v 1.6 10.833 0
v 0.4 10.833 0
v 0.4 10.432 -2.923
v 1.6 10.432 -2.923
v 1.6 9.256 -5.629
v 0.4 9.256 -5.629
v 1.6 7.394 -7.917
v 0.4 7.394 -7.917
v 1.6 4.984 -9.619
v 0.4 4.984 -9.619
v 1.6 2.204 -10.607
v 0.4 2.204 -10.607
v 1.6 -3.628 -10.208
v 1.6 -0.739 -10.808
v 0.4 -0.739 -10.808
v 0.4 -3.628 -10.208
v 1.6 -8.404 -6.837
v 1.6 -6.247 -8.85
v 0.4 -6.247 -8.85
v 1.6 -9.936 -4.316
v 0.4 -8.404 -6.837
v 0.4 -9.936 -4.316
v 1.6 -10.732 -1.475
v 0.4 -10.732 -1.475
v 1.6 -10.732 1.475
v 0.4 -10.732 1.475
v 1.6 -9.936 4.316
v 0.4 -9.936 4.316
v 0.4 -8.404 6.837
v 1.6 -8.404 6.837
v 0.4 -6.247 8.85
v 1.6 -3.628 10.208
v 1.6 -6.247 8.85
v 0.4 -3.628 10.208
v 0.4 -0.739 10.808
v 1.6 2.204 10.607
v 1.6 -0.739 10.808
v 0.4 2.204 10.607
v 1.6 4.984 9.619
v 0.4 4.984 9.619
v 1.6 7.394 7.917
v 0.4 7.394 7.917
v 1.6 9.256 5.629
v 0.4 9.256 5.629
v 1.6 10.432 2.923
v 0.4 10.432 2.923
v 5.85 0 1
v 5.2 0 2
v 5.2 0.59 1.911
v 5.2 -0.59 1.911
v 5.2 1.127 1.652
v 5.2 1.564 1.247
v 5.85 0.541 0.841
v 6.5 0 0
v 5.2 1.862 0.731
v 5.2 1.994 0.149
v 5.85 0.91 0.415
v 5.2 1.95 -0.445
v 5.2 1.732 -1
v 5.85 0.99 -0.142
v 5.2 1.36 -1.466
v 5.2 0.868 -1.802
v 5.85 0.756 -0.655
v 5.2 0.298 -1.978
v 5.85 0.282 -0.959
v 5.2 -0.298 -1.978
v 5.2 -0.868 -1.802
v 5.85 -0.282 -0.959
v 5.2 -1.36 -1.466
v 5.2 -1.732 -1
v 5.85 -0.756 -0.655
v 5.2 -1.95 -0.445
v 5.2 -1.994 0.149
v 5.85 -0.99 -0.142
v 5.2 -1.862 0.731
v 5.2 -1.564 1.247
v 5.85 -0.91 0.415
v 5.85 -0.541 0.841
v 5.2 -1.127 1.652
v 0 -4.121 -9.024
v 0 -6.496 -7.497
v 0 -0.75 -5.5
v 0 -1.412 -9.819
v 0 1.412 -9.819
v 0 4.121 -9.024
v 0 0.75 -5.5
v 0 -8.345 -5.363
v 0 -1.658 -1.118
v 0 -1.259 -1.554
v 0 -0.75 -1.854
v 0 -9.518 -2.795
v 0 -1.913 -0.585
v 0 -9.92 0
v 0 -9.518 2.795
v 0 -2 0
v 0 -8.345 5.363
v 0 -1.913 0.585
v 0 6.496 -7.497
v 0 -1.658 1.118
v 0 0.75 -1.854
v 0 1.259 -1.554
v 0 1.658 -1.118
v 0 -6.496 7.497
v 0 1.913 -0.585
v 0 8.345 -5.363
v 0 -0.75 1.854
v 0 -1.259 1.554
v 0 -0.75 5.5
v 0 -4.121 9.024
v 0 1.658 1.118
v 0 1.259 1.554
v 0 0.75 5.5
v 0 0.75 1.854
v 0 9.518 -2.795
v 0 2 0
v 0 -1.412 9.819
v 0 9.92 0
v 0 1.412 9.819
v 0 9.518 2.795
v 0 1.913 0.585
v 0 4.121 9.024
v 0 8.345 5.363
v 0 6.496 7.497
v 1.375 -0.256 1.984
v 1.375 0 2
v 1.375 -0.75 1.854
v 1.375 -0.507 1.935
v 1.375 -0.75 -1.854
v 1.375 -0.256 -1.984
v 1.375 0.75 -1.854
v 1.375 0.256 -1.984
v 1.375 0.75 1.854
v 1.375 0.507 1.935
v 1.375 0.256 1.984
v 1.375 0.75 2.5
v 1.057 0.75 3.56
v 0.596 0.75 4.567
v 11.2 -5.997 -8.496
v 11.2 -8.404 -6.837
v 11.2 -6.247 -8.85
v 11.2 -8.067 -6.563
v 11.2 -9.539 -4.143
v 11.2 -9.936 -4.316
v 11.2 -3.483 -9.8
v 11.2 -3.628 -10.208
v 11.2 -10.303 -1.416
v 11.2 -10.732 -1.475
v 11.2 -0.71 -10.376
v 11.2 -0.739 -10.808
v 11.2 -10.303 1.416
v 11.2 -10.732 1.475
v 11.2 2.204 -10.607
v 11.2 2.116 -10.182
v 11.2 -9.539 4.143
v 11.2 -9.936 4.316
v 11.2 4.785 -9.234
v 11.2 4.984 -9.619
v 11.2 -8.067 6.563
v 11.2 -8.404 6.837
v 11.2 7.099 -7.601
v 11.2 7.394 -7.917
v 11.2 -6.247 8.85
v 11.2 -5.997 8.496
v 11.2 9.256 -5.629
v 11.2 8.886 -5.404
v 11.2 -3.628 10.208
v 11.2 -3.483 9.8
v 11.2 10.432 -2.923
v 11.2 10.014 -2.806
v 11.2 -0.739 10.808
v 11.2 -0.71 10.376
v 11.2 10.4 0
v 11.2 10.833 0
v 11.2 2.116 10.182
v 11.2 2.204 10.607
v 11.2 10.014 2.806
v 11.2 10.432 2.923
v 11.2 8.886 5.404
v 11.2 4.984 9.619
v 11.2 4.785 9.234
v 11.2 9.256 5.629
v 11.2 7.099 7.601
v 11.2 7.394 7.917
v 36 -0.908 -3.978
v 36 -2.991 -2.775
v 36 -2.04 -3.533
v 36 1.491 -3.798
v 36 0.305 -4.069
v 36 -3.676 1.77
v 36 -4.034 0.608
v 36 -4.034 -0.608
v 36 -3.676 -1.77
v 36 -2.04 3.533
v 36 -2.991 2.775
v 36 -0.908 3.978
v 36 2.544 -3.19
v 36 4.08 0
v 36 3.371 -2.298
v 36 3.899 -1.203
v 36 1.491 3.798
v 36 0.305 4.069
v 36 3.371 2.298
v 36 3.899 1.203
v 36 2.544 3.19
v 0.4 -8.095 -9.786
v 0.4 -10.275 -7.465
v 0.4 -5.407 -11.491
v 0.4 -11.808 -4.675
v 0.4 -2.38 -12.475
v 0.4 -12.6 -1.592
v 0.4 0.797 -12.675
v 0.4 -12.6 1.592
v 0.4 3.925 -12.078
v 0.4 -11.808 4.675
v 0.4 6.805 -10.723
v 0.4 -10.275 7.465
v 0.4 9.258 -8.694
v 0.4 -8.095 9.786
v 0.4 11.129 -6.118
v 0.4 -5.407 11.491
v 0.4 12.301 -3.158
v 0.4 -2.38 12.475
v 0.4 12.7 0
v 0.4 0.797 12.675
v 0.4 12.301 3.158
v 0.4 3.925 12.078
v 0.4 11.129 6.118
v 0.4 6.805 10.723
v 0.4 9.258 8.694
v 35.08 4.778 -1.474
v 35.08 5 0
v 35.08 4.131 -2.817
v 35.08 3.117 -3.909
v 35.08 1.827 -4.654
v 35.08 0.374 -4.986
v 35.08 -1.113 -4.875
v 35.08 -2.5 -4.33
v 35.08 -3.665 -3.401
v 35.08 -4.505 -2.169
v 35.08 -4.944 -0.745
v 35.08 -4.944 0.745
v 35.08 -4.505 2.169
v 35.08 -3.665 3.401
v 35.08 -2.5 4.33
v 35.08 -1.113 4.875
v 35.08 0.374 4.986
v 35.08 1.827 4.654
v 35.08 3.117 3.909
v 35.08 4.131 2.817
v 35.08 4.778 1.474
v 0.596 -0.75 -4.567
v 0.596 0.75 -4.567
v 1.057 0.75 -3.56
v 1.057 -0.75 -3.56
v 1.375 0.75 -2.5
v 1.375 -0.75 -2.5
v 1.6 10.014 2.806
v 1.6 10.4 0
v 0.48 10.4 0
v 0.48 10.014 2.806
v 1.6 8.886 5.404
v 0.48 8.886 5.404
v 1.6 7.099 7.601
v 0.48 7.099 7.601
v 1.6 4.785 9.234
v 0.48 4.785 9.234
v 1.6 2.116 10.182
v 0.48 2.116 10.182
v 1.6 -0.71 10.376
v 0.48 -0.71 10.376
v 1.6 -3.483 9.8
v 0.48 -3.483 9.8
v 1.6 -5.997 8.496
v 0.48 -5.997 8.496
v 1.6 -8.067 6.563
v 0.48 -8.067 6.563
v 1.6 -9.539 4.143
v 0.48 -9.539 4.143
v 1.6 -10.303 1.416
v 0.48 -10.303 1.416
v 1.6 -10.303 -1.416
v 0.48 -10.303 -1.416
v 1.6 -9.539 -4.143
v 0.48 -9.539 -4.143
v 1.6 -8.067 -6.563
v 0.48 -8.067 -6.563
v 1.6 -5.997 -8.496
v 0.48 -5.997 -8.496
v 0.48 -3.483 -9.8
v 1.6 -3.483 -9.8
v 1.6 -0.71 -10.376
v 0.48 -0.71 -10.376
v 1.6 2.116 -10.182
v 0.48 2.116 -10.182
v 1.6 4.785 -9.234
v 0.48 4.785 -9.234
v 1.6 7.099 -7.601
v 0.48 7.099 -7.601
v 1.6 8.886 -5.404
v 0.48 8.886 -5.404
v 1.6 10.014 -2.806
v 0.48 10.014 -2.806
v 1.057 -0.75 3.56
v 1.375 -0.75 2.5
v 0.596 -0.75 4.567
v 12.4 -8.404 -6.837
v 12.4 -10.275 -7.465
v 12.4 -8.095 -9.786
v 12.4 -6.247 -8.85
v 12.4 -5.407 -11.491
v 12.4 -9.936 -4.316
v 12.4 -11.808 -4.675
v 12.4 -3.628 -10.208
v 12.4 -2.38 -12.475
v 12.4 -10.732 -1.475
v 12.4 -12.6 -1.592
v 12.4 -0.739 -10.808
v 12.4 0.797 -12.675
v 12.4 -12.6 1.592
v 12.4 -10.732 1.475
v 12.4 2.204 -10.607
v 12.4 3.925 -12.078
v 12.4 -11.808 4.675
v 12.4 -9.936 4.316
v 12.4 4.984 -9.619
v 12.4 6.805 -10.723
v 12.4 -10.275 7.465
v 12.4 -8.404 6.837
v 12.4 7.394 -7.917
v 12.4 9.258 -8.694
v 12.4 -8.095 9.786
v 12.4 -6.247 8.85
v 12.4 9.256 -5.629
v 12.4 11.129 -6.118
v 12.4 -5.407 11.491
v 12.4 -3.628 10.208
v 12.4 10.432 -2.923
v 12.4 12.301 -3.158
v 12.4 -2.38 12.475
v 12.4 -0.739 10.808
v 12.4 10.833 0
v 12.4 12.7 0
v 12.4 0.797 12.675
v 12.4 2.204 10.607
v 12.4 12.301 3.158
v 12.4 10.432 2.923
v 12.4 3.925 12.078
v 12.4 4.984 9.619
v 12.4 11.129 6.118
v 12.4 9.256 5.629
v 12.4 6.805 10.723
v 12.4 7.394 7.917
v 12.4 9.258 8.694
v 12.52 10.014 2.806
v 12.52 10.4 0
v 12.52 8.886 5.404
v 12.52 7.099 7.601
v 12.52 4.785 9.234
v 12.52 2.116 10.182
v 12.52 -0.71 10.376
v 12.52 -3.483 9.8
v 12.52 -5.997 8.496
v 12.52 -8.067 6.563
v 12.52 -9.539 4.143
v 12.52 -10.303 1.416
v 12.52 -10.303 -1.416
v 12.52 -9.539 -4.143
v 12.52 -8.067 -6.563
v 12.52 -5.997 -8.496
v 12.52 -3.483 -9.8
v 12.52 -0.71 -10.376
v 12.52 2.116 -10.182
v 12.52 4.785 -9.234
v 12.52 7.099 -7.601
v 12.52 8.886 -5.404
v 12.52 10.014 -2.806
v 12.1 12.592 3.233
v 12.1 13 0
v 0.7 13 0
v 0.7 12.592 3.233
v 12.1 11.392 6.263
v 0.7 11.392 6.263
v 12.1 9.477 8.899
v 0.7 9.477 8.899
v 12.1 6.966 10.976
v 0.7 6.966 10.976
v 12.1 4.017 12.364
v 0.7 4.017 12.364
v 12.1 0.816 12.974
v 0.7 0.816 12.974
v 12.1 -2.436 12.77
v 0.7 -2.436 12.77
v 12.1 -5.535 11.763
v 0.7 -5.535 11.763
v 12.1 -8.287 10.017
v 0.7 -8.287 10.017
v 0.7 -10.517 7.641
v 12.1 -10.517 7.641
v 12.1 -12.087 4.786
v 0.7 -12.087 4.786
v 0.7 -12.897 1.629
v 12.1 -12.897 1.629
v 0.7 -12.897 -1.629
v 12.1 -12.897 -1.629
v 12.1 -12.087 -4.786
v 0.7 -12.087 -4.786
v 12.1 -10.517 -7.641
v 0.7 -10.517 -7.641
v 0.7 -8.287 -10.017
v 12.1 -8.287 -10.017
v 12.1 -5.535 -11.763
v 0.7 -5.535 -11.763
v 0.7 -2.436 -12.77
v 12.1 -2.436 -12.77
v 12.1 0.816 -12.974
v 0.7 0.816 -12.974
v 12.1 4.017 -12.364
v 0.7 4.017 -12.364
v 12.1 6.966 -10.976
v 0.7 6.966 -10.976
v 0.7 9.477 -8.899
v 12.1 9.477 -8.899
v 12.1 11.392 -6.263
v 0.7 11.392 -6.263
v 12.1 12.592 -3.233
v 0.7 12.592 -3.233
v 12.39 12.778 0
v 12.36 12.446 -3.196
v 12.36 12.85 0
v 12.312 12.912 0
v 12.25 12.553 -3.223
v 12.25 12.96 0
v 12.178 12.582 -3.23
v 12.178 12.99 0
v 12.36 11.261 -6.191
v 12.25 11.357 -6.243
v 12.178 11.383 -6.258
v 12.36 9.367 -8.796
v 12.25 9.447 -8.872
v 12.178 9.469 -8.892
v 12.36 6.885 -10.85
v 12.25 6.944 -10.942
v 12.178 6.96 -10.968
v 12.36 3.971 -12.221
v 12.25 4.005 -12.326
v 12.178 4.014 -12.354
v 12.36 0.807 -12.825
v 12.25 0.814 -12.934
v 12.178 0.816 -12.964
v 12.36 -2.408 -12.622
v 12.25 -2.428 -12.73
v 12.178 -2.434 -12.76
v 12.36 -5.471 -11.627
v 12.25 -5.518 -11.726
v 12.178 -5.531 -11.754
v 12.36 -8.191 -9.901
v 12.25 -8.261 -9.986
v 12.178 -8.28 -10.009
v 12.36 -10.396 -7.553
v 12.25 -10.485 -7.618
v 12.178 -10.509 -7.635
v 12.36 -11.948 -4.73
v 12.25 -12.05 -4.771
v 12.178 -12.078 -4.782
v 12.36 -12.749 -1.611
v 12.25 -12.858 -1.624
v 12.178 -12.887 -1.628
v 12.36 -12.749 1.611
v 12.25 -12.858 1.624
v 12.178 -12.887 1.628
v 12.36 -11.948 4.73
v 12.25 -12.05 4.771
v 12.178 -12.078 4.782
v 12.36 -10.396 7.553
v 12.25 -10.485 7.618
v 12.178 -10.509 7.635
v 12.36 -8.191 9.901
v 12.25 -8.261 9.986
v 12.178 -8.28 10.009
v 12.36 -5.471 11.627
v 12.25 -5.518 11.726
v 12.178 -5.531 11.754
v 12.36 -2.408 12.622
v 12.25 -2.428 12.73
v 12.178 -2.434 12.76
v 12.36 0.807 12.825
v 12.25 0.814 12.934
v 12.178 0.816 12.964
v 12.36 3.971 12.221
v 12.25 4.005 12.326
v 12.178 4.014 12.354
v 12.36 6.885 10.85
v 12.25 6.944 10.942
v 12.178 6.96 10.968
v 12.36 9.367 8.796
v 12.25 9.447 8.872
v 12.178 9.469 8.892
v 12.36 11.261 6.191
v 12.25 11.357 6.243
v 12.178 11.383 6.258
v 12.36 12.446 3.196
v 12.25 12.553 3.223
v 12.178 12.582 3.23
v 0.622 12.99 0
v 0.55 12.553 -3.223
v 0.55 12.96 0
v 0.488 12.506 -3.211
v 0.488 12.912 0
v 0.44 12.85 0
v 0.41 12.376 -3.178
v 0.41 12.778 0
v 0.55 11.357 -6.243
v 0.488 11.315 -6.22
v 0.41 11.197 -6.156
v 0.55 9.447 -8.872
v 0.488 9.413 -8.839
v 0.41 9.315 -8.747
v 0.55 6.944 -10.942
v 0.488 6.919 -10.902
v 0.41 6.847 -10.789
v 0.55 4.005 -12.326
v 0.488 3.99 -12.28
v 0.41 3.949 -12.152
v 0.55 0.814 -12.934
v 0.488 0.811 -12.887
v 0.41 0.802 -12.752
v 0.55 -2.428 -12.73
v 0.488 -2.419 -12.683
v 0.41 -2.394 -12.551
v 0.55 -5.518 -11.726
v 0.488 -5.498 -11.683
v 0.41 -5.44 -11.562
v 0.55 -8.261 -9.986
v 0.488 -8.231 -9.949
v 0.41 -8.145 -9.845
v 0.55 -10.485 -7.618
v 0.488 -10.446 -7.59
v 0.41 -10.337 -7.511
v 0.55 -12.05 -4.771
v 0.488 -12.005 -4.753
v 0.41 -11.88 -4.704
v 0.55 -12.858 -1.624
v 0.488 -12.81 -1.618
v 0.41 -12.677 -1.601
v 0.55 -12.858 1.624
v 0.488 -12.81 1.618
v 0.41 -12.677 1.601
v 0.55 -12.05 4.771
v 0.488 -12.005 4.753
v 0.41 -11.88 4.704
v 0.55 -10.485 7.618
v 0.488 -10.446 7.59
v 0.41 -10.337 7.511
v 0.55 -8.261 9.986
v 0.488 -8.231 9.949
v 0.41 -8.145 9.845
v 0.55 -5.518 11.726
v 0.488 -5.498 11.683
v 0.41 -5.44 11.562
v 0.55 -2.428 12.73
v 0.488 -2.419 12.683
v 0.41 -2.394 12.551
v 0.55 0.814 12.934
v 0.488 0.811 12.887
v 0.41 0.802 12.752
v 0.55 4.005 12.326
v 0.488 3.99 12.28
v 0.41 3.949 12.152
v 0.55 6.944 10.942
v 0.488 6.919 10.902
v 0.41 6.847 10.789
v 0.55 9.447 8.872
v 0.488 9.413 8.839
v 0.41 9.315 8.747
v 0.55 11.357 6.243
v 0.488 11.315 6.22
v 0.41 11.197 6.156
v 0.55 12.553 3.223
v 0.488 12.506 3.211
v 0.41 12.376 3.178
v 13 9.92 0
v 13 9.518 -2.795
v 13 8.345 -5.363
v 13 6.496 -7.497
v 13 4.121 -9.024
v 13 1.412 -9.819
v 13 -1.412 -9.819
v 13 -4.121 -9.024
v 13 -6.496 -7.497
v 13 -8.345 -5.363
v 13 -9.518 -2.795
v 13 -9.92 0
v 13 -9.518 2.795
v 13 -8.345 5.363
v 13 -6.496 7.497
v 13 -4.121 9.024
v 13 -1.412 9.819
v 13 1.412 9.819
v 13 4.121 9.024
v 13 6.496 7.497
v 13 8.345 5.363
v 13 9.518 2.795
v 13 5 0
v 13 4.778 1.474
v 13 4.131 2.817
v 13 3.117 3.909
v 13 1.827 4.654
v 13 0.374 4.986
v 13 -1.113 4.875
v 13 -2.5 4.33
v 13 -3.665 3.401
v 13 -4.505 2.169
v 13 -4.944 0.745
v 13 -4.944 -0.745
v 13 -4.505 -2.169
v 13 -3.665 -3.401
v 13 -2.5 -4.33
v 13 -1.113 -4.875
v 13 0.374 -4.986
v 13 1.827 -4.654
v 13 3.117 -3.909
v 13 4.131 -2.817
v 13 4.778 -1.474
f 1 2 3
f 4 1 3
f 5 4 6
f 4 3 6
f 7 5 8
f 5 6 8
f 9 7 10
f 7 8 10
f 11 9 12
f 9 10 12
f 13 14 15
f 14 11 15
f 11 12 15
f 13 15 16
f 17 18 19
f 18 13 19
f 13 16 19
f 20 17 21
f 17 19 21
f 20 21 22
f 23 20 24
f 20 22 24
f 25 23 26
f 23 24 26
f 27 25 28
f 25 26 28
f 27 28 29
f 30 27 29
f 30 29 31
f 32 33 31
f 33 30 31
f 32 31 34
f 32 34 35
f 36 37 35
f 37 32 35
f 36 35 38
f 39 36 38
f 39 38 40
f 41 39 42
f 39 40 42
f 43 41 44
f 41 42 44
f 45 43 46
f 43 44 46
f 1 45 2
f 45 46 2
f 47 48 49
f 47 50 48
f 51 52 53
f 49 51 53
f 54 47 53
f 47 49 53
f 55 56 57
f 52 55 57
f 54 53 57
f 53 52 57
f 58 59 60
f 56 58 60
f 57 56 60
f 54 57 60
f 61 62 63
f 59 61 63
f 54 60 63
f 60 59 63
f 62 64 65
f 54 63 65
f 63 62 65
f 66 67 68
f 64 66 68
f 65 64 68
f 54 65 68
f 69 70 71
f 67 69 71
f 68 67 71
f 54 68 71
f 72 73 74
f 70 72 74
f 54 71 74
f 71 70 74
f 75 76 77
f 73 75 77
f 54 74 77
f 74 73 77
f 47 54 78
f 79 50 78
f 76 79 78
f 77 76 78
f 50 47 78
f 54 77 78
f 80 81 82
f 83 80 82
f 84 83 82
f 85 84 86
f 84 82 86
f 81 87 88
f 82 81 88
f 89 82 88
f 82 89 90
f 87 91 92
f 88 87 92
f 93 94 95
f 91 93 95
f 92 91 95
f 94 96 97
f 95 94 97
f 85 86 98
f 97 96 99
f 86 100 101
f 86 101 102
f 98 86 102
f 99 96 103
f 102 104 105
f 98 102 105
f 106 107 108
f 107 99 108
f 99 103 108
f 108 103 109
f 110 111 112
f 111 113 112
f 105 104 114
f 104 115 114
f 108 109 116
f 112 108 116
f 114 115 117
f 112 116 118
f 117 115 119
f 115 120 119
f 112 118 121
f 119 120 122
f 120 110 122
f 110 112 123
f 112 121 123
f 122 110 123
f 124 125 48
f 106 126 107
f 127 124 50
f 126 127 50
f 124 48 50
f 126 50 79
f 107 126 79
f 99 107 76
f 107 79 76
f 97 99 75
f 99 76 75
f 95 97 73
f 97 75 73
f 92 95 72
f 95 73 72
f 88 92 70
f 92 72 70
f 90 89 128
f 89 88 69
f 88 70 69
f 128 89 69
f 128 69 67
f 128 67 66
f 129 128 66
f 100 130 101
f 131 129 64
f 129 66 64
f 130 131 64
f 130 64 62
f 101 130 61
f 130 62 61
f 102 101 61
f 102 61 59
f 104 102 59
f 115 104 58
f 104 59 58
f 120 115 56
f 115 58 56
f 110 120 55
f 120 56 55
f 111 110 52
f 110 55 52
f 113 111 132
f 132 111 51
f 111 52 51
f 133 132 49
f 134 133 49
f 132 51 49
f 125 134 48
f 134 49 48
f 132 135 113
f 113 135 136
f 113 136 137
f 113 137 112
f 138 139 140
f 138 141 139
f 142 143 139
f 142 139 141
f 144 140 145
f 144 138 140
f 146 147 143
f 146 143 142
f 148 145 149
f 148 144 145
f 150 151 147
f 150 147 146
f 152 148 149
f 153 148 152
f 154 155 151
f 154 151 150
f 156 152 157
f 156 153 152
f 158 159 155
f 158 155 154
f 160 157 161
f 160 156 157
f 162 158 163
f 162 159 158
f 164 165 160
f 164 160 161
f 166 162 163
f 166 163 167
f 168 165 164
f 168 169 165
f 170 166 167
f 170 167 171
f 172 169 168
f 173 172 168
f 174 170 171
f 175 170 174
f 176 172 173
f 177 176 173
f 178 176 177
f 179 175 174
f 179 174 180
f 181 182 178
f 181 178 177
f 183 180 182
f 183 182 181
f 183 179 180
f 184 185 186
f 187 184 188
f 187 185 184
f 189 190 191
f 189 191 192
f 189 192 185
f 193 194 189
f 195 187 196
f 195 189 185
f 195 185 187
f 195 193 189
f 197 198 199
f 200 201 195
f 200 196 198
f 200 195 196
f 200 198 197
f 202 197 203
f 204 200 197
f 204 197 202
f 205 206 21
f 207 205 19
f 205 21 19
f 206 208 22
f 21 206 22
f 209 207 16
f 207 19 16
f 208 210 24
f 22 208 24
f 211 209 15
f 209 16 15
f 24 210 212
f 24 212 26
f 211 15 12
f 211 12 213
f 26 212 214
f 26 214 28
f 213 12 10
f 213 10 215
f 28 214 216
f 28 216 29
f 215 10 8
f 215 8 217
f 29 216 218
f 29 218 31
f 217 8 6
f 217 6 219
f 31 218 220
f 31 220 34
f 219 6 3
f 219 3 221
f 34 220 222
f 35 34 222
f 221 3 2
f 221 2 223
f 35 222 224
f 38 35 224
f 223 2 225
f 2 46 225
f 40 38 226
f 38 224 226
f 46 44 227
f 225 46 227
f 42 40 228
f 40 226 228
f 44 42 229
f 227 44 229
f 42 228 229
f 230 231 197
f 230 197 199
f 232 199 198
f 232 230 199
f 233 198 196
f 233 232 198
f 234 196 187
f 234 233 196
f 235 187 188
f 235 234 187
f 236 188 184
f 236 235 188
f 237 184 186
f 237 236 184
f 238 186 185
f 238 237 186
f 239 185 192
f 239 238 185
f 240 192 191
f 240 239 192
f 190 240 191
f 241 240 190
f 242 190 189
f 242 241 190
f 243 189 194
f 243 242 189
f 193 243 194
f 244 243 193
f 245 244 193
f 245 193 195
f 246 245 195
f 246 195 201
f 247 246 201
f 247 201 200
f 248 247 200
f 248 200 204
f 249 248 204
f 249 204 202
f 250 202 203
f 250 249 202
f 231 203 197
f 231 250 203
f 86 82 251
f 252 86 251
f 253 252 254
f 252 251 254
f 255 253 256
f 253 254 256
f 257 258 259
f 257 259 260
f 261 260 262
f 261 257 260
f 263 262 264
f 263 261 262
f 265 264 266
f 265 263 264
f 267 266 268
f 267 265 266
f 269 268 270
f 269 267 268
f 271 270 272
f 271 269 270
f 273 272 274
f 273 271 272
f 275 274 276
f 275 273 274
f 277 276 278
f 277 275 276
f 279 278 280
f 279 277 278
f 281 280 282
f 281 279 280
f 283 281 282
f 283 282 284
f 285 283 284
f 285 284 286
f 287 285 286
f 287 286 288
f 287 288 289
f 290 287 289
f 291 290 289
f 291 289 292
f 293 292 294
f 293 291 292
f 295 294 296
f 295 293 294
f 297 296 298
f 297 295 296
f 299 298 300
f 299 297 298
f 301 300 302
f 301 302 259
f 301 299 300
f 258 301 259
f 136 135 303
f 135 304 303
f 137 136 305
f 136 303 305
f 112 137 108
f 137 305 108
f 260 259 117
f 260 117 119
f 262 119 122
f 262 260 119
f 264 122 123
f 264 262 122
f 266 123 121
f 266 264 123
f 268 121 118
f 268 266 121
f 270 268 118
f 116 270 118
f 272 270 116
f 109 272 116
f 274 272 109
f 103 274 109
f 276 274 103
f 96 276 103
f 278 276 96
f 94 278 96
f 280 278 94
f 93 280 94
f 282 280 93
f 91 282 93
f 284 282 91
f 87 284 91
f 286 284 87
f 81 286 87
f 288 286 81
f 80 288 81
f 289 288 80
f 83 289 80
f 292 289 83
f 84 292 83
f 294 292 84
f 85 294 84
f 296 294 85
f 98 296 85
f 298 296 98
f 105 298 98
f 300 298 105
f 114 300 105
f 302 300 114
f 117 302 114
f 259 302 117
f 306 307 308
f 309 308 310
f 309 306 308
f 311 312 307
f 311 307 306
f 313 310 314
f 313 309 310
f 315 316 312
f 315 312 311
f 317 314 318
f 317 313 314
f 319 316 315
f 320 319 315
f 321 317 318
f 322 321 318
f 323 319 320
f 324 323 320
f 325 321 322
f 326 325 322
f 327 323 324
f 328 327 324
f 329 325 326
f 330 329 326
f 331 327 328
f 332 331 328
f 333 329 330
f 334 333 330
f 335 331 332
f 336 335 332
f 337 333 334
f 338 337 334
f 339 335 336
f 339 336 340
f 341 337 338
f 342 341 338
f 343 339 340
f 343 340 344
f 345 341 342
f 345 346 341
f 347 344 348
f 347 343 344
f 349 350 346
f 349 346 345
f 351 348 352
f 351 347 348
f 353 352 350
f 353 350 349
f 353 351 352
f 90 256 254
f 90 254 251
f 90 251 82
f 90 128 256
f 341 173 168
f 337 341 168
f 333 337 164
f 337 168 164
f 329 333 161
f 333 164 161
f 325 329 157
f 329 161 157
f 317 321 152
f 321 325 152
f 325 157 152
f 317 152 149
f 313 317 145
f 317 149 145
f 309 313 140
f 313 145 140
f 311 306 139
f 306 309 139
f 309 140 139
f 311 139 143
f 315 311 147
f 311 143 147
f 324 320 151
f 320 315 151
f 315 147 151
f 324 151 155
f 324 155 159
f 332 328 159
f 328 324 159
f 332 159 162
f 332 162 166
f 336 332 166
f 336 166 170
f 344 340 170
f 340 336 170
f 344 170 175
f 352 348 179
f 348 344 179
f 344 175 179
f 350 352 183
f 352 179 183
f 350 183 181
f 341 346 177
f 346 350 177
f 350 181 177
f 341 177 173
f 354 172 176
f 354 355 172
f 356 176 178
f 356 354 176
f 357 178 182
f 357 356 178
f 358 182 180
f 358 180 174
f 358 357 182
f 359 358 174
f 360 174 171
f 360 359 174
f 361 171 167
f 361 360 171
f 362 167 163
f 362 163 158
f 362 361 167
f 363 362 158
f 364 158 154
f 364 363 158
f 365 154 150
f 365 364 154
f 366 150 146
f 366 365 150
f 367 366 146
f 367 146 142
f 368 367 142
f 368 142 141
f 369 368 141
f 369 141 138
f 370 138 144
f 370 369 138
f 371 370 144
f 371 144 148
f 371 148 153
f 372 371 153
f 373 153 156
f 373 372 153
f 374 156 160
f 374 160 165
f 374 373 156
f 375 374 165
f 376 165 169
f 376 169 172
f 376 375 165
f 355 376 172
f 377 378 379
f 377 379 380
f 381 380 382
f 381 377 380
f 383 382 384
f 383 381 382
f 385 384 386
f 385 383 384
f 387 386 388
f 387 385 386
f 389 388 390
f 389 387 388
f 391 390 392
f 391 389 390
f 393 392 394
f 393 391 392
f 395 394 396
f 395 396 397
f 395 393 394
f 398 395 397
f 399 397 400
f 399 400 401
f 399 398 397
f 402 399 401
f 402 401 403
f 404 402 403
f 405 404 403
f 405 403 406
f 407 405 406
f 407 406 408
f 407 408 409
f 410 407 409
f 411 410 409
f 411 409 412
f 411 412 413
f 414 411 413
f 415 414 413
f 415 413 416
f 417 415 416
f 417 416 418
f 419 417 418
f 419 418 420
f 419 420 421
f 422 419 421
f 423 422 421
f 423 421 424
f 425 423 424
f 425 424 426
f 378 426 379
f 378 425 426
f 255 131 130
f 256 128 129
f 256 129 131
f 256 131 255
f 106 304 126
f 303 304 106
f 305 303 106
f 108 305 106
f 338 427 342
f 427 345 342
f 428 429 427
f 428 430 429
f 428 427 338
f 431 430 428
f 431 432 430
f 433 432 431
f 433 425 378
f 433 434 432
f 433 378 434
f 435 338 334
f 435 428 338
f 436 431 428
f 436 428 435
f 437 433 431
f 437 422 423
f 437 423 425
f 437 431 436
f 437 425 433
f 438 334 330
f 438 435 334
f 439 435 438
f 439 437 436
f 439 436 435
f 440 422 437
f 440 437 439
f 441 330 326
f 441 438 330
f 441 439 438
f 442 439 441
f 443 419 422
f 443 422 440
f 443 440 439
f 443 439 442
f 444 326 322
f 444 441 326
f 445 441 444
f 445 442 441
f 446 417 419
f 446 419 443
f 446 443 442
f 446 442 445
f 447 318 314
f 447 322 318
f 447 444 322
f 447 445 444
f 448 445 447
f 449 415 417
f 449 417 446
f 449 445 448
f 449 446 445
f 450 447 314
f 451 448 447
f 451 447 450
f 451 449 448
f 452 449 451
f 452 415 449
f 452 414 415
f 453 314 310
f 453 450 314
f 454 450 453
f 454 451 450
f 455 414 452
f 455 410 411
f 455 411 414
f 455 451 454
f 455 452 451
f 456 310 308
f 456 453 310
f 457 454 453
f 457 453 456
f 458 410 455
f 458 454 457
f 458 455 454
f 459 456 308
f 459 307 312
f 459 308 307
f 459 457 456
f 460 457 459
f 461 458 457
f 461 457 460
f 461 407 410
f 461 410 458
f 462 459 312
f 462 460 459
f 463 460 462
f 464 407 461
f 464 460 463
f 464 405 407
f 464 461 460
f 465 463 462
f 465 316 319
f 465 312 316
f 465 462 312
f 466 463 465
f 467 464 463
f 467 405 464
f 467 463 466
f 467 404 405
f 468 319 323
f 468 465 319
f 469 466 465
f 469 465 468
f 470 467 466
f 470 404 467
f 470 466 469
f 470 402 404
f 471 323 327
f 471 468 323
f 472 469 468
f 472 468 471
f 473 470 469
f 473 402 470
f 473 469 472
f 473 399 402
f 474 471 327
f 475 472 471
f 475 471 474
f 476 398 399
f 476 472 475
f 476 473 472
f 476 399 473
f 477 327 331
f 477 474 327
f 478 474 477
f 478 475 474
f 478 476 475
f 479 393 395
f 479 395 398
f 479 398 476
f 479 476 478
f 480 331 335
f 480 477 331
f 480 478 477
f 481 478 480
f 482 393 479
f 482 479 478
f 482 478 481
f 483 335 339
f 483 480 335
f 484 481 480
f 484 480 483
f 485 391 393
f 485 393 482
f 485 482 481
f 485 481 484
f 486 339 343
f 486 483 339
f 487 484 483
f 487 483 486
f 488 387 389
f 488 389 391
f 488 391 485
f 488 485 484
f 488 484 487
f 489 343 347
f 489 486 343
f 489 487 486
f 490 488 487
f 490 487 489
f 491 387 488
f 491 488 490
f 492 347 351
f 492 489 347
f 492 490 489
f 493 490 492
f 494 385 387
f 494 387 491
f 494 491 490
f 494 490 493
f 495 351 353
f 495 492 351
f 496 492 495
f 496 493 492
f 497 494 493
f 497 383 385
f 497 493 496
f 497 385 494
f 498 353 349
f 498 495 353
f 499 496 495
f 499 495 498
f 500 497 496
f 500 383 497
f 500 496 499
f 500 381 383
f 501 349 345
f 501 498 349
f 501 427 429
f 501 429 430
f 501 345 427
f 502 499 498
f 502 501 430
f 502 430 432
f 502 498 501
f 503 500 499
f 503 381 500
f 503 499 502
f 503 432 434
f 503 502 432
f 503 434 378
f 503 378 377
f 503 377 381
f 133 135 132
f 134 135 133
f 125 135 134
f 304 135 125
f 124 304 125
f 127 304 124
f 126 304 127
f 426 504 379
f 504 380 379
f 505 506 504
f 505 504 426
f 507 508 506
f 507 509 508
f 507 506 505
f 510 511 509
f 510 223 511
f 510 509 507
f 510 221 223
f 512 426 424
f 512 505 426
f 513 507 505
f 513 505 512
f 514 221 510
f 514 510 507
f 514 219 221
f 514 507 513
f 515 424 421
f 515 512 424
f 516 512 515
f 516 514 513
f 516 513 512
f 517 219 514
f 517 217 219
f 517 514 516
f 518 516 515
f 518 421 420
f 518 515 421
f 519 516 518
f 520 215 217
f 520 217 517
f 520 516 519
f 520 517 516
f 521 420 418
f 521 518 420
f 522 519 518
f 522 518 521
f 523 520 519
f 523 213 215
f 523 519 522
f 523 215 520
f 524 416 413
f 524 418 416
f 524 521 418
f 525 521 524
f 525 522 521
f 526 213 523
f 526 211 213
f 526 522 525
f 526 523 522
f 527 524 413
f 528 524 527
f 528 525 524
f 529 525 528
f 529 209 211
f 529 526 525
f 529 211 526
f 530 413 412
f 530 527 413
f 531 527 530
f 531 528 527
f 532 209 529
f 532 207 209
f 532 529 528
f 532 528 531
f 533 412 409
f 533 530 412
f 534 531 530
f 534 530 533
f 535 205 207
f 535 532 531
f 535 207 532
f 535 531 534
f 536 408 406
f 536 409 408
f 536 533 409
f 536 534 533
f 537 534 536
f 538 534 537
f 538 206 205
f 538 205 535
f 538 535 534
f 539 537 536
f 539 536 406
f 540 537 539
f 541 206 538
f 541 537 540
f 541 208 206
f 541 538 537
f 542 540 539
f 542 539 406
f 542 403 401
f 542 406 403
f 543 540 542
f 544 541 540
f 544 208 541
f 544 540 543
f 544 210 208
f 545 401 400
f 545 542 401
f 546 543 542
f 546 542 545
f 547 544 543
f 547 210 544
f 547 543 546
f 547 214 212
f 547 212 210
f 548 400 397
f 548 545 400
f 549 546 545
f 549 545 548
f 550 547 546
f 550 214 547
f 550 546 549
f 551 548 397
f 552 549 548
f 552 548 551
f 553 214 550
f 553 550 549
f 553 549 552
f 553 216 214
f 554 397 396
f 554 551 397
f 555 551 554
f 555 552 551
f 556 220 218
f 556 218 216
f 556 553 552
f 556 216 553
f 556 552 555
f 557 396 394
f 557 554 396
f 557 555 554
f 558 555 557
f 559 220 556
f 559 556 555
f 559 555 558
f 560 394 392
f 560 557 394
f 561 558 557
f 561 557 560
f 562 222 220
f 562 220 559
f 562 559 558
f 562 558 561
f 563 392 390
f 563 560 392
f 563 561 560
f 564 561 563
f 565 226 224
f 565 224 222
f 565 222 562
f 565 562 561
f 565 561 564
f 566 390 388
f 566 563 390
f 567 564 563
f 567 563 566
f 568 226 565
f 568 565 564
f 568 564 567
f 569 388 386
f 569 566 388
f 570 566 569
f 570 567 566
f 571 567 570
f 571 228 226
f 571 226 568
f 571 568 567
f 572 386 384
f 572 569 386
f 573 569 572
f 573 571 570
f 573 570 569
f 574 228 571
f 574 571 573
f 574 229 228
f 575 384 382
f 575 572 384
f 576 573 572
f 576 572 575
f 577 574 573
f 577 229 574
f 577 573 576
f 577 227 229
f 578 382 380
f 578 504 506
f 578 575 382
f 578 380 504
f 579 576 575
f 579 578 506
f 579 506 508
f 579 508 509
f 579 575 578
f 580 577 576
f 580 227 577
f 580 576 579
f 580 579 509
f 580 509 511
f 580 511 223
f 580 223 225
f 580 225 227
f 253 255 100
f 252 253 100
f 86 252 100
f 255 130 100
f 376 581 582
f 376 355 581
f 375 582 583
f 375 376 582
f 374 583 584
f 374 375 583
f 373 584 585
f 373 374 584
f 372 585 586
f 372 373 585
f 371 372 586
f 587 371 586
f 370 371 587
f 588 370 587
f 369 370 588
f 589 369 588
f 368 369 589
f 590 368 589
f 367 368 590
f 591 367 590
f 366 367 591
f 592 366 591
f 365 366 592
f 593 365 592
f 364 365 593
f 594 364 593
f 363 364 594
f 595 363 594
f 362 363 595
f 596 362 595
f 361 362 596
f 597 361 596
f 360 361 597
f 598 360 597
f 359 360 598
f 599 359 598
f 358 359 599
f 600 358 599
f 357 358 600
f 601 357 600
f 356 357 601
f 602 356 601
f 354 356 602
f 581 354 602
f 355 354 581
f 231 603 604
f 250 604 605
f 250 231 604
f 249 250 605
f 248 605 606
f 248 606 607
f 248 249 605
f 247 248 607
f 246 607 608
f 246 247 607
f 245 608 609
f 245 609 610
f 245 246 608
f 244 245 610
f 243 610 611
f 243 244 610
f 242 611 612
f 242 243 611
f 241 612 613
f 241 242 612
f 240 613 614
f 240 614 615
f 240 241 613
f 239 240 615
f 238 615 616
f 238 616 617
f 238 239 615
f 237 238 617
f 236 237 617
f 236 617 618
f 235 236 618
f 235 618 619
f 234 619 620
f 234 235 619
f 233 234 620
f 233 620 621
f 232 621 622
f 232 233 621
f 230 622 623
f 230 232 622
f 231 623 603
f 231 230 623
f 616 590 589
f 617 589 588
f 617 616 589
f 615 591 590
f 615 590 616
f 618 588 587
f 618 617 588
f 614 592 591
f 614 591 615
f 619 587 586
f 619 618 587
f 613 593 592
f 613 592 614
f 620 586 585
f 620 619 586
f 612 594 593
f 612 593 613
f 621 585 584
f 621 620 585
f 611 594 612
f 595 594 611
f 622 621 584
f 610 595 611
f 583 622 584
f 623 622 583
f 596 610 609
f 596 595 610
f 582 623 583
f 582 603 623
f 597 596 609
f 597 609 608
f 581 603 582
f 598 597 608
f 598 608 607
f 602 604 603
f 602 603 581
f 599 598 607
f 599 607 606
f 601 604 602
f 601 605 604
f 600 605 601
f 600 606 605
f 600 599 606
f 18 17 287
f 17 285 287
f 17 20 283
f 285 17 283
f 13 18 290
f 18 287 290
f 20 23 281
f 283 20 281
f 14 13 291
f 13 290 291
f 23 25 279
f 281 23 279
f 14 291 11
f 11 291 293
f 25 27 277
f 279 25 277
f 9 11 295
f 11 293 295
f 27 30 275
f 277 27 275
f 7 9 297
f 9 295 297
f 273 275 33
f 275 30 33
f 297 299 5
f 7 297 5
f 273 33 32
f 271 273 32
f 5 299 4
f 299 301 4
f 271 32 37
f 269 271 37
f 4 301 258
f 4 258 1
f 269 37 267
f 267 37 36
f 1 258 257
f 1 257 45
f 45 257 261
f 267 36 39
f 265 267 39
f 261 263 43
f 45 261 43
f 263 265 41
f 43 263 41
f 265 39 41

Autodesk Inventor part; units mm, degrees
sketch "Sketch_1" plane through (0, 0, 0) normal (0, 0, 1) x (1, 0, 0)
  line L0 (36, 0) -> (0, 0)
  line L1 (0, 0) -> (0, 9.92)
  line L2 (0, 9.92) -> (0.48, 10.4)
  line L3 (0.48, 10.4) -> (1.6, 10.4)
  line L4 (1.6, 10.4) -> (1.6, 10.8333)
  line L5 (1.6, 10.8333) -> (0.4, 10.8333)
  line L6 (0.4, 10.8333) -> (0.4, 12.7)
  arc A0 (0.7, 13) -> (0.4, 12.7) centre (0.7, 12.7) ccw
  line L7 (0.7, 13) -> (12.1, 13)
  arc A1 (12.4, 12.7) -> (12.1, 13) centre (12.1, 12.7) ccw
  line L8 (12.4, 12.7) -> (12.4, 10.8333)
  line L9 (12.4, 10.8333) -> (11.2, 10.8333)
  line L10 (11.2, 10.8333) -> (11.2, 10.4)
  line L11 (11.2, 10.4) -> (12.52, 10.4)
  line L12 (12.52, 10.4) -> (13, 9.92)
  line L13 (13, 9.92) -> (13, 5)
  line L14 (13, 5) -> (35.08, 5)
  line L15 (35.08, 5) -> (36, 4.08)
  line L16 (36, 4.08) -> (36, 0)
  line L17 (36, 0) -> (0, 0)
revolve "Revolution1" add sketch "Sketch_1" angle 360 about axis through (36, 0, 0) along (1, 0, 0)
thread "Thread1" size "M10x1.5" class "6g" standard "ISO Metric profile" length 11.08
sketch "Sketch2" plane through (0, 0, 0) normal (-1, 0, 0) x (0, 0, 1)
  point P0 (0, 0)
hole "Hole1" at (0, 0, 0) direction (1, 0, 0) diameter 4 depth 5.2 tip angle 113.952
sketch "Sketch_5" plane through (0, 0, 0) normal (0, 1, 0) x (-1, 0, 0)
  arc A0 (0, 5.5) -> (-1.375, 2.5) centre (6.4286, 0.7384) ccw
  line L0 (-1.375, 2.5) -> (-1.375, -2.5)
  arc A1 (-1.375, -2.5) -> (0, -5.5) centre (6.4286, -0.7384) ccw
  line L1 (0, -5.5) -> (0, 5.5)
extrude "Extrusion1" cut sketch "Sketch_5" along normal mid plane 1.5
ref_plane "IP_dummy_XY" through (0, 0, 0) normal (1, 0, 0) x (0, 0, -1)
ref_plane "IP_dummy_YZ" through (0, 0, 0) normal (0, 0, -1) x (0, 1, 0)
ref_plane "IP_dummy_ZX" through (0, 0, 0) normal (0, 1, 0) x (1, 0, 0)
ref_plane "IP_grease_nipple_XY" through (0, 0, 0) normal (1, 0, 0) x (0, 0, -1)
ref_plane "IP_grease_nipple_YZ" through (0, 0, 0) normal (0, 0, -1) x (0, 1, 0)
ref_plane "IP_grease_nipple_ZX" through (0, 0, 0) normal (0, 1, 0) x (1, 0, 0)
properties part number "CAM FOLLOWER"
